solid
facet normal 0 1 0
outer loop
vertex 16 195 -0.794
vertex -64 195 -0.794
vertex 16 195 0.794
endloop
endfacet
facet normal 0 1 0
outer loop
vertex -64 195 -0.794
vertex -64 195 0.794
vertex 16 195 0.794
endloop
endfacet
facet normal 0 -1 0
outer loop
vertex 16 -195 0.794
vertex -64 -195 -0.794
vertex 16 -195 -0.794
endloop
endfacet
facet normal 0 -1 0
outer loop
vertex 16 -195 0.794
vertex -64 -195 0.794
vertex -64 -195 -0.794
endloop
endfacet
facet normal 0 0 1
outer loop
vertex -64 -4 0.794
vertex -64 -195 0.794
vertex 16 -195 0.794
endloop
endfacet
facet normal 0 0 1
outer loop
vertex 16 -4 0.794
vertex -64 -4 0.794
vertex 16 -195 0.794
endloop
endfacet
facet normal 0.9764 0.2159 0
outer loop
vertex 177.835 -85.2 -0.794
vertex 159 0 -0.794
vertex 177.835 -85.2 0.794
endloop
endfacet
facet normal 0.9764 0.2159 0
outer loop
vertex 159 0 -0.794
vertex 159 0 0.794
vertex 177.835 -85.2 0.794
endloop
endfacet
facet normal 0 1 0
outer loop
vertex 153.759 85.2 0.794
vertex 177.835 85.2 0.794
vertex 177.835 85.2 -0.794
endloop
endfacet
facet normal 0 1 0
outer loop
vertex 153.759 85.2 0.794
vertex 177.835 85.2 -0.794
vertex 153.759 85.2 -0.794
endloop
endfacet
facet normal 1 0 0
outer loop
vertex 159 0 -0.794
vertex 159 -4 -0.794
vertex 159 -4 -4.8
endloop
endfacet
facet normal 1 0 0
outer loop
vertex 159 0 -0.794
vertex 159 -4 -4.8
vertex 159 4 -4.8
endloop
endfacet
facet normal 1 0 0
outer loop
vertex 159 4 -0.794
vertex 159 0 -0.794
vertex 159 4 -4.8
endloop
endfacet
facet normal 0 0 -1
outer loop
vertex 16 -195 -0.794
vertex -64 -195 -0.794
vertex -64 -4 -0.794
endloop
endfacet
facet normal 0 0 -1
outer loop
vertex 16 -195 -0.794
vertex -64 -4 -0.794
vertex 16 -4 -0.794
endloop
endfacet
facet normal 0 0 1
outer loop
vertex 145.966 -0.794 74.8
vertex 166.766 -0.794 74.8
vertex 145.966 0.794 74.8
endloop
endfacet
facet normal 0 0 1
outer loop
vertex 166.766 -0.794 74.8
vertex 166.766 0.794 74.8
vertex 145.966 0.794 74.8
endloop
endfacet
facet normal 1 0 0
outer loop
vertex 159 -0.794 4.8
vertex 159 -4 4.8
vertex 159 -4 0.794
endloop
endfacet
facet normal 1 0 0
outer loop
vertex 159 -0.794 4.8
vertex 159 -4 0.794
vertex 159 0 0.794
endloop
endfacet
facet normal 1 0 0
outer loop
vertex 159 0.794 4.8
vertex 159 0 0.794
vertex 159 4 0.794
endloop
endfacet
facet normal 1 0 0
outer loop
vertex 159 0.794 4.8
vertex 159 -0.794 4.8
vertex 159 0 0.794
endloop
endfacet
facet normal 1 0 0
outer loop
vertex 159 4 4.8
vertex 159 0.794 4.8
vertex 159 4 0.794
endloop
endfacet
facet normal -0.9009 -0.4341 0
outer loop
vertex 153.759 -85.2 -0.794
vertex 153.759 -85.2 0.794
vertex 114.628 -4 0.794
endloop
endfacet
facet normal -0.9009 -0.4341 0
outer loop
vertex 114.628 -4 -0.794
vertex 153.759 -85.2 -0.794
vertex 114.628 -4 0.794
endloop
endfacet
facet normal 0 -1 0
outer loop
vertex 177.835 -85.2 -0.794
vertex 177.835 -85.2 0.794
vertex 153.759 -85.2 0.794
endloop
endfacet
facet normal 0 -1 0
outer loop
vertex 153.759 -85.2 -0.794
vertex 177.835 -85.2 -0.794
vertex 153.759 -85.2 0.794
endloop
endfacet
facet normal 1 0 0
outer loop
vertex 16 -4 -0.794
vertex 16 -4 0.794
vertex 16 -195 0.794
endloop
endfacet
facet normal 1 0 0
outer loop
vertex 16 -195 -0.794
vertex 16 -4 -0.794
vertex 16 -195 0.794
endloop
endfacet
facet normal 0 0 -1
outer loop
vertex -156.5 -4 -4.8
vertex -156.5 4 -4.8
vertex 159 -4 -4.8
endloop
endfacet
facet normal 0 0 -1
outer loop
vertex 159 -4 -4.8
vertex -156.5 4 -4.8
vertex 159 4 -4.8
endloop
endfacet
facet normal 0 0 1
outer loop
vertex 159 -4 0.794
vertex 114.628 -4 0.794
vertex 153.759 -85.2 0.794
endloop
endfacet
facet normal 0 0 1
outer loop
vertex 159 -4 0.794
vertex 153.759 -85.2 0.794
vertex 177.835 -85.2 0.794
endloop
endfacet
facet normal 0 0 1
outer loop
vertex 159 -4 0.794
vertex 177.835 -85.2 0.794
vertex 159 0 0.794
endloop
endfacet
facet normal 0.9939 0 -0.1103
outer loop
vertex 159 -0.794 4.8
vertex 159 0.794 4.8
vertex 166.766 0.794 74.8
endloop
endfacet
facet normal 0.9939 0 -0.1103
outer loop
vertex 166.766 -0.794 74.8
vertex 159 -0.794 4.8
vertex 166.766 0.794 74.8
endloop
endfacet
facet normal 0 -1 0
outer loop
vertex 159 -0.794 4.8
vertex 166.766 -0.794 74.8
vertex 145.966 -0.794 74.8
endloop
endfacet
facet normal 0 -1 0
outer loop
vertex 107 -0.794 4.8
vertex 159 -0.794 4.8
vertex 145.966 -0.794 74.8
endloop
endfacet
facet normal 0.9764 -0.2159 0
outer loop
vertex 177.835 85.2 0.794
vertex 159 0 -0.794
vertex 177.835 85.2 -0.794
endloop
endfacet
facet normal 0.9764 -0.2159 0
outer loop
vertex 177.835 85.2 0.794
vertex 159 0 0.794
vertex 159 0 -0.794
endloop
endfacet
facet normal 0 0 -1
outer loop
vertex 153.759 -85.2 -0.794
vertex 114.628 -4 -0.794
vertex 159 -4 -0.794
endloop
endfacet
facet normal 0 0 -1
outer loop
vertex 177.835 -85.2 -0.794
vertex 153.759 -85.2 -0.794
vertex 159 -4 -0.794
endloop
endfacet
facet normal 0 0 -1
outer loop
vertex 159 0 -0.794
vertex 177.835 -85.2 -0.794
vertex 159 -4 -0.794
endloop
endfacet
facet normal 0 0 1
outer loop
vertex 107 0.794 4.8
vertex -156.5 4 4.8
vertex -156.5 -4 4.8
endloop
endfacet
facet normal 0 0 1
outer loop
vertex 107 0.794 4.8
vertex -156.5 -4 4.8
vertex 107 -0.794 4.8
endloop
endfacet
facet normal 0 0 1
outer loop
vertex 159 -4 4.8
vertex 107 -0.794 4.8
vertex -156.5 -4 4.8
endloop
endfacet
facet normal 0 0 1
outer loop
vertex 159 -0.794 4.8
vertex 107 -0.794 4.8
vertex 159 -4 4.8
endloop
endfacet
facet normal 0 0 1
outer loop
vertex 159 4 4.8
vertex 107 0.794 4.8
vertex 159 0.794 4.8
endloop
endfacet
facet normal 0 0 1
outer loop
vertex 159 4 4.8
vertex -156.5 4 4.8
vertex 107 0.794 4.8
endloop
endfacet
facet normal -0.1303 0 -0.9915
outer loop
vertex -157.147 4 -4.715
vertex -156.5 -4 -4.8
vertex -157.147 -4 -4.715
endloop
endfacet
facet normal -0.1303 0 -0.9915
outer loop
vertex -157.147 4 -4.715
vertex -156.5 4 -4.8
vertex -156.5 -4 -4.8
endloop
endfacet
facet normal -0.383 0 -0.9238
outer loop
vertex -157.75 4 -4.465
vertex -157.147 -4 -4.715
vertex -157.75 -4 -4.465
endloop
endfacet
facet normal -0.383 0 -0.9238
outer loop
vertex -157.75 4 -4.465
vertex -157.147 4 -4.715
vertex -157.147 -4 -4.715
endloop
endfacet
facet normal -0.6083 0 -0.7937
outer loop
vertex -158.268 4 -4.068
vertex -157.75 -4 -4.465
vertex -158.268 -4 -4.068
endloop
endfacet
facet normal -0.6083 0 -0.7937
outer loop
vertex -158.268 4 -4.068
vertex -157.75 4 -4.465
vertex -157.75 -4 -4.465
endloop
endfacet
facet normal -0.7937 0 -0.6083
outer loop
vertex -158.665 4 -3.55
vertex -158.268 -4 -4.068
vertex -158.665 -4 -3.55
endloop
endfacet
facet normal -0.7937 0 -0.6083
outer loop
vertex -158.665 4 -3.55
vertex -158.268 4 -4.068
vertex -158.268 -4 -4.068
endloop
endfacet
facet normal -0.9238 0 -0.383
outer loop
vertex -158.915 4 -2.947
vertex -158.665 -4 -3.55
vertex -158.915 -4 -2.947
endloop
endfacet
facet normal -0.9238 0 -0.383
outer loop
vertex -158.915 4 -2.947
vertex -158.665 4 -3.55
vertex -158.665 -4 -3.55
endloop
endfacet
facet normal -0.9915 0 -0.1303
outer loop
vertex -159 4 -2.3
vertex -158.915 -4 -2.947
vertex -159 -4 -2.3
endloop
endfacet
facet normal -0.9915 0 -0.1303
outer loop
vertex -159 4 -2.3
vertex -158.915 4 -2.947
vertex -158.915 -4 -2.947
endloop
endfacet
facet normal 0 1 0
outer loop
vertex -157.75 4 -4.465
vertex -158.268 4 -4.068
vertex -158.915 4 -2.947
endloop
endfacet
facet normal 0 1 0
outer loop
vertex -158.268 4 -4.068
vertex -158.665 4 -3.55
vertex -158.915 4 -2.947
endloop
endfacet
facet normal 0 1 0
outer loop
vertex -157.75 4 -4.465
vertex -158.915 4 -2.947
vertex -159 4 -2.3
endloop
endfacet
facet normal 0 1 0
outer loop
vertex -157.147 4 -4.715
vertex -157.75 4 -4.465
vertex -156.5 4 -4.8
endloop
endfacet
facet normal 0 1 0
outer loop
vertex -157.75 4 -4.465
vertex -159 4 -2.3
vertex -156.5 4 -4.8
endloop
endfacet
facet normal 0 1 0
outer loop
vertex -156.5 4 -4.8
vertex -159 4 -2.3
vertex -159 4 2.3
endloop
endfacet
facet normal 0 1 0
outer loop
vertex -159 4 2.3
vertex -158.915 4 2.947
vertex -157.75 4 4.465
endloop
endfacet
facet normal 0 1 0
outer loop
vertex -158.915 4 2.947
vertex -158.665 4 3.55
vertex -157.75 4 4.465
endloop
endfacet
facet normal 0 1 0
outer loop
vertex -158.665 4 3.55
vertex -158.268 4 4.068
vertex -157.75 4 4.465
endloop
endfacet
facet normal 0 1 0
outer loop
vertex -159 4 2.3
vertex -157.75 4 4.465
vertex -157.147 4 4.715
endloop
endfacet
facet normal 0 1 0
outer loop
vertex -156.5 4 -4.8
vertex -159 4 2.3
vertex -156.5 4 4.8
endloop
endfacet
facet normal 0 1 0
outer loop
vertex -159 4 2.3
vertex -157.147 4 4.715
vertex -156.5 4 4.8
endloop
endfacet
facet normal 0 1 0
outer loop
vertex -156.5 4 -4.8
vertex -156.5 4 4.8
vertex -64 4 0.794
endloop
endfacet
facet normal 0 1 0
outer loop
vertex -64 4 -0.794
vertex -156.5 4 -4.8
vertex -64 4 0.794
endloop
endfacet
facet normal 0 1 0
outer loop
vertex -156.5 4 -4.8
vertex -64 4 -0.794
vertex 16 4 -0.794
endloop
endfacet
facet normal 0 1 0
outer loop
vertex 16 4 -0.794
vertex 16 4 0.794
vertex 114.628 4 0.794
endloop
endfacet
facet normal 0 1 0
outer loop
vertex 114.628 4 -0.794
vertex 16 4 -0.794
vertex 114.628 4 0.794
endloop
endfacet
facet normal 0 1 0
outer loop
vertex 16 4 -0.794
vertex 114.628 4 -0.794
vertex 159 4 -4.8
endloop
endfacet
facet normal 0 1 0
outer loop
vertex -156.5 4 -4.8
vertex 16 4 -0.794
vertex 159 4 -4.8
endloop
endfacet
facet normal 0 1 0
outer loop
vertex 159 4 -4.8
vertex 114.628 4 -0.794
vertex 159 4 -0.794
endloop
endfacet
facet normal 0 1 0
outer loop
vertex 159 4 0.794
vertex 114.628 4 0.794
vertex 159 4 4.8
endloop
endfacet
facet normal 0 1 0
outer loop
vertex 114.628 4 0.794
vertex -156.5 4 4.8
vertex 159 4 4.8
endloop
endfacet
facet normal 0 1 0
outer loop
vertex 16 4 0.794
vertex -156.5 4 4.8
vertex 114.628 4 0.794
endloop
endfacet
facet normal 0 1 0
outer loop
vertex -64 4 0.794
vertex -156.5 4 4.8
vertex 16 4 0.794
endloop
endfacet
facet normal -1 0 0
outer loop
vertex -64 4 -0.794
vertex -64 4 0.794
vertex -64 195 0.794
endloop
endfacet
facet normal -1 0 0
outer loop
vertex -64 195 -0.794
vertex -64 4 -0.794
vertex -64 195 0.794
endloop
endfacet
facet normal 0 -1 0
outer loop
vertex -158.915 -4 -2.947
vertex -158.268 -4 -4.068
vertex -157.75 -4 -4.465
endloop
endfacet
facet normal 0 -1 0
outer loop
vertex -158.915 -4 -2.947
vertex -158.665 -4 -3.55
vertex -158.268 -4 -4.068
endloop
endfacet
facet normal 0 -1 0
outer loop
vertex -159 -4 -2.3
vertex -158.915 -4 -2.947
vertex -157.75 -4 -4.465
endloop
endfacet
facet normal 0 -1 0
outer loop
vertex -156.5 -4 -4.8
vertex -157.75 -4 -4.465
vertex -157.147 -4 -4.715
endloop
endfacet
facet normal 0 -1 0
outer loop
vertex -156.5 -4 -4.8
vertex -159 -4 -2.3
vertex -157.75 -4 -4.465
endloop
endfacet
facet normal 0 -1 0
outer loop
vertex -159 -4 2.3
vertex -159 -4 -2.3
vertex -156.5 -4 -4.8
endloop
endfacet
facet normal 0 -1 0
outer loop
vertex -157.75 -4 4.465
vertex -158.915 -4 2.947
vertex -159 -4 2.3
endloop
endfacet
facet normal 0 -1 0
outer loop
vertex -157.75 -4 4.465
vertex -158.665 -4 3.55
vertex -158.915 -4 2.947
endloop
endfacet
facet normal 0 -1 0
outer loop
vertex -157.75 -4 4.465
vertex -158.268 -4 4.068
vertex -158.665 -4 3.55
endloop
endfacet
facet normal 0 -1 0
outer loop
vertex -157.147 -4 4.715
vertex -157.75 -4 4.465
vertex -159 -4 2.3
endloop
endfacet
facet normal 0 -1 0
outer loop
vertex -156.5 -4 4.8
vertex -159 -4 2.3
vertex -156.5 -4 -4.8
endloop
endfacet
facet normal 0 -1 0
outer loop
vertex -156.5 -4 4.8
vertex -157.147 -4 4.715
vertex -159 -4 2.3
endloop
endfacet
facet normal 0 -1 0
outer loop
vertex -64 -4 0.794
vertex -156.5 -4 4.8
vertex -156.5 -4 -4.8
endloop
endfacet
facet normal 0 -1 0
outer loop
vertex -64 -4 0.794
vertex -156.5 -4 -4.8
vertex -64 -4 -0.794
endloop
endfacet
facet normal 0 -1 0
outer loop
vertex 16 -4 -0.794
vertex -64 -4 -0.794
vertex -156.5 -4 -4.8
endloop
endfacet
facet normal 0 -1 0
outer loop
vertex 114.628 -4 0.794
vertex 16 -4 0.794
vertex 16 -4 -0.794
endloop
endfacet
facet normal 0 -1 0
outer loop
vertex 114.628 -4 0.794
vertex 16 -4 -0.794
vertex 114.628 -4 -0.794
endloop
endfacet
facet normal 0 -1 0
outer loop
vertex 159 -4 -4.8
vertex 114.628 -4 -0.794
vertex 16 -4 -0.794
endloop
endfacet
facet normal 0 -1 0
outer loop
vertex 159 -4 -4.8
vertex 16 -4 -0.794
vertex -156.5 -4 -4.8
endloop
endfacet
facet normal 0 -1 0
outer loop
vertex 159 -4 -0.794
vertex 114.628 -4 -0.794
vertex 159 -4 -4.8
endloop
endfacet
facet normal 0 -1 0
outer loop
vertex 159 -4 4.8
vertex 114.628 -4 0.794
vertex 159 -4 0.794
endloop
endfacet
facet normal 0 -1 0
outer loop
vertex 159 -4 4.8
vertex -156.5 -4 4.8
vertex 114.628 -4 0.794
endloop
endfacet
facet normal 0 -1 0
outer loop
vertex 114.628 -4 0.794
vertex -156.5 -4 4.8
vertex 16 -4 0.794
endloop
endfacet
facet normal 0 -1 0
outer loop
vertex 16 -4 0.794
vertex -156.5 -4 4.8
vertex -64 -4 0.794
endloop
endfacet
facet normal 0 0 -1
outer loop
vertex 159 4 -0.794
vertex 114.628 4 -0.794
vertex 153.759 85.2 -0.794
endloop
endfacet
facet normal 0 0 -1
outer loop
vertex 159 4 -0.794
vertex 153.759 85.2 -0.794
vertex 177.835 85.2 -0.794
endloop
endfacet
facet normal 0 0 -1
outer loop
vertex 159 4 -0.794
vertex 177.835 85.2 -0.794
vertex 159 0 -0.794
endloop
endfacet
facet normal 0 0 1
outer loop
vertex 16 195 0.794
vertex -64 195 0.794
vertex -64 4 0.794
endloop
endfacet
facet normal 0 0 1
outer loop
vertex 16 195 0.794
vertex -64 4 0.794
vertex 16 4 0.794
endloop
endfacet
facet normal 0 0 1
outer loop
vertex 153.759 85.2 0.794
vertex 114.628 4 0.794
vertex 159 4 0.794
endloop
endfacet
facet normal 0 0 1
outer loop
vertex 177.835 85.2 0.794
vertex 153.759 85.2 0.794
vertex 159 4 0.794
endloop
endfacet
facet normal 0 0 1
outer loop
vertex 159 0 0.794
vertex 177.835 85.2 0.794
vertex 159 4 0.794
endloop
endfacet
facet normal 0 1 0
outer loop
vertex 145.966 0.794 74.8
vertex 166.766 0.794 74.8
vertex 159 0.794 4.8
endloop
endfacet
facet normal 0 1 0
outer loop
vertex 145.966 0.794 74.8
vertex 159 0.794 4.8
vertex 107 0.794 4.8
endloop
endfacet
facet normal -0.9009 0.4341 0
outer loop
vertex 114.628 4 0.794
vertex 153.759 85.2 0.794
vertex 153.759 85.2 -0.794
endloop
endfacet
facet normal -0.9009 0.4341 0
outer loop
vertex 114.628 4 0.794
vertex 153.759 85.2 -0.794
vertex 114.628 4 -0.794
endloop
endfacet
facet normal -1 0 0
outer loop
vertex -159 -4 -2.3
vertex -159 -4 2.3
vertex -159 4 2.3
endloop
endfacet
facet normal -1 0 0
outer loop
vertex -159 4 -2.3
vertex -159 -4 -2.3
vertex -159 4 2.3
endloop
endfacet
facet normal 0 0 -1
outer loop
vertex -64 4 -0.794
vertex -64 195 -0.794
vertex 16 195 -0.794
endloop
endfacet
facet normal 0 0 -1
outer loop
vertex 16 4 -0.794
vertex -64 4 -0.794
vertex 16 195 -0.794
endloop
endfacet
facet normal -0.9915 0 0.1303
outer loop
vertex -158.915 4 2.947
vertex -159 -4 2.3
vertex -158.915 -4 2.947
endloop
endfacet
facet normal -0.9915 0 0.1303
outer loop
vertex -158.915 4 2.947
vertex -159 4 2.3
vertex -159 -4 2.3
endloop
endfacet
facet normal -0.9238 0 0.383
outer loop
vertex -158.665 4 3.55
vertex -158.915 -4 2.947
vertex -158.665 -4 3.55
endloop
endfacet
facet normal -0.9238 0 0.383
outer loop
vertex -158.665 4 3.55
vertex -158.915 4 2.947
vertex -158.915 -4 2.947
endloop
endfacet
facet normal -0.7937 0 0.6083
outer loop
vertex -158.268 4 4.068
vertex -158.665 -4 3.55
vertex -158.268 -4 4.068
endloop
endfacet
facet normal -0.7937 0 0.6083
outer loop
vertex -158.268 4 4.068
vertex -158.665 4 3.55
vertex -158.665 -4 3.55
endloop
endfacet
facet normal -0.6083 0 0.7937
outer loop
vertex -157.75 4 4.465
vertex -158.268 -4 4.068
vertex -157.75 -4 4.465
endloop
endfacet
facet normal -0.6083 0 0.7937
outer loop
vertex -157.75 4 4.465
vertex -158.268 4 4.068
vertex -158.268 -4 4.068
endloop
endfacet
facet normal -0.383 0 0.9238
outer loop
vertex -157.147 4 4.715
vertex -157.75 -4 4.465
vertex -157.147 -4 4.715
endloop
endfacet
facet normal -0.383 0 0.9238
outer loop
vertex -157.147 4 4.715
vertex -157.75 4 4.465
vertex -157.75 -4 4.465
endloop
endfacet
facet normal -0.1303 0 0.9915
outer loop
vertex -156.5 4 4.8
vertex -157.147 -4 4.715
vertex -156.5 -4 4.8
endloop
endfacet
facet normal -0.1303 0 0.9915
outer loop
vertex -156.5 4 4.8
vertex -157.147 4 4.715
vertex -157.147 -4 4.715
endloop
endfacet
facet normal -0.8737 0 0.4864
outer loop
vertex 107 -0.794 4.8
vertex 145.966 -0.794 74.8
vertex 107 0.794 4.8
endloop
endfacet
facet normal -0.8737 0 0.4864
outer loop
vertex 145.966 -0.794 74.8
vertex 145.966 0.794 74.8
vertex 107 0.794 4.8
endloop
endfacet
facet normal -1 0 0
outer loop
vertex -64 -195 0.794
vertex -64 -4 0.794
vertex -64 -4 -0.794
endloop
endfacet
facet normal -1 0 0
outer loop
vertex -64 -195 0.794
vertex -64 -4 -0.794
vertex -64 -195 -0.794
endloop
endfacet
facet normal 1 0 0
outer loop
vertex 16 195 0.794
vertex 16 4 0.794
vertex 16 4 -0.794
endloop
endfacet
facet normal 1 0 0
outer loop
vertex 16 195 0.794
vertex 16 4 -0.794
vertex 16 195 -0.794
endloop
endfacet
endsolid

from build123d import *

# Parameters (mm, degrees)
SKETCH1_W           = 318
SKETCH1_H           = 8
BOSS_EXTRUDE1_DEPTH = 4.8
SKETCH3_W           = 80
SKETCH3_H           = 195
BOSS_EXTRUDE2_DEPTH = 0.79375
BOSS_EXTRUDE3_DEPTH = 0.79375
BOSS_EXTRUDE4_DEPTH = 0.79375
FILLET1_R           = 2.5


with BuildPart() as part:
    # Sketch1 → Boss-Extrude1 (new, symmetric)
    with BuildSketch(Plane.XY):
        Rectangle(SKETCH1_W, SKETCH1_H)
    extrude(amount=BOSS_EXTRUDE1_DEPTH, both=True)

    # Sketch3 → Boss-Extrude2 (add, symmetric)
    with BuildSketch(Plane.XY):
        with Locations((-24, 97.5)):
            Rectangle(SKETCH3_W, SKETCH3_H)
    boss_extrude2 = extrude(amount=BOSS_EXTRUDE2_DEPTH, both=True)

    # Mirror1: Boss-Extrude2 across plane
    add(boss_extrude2.mirror(Plane.ZX))

    # Sketch6 → Boss-Extrude3 (add, symmetric)
    with BuildSketch(Plane(origin=(0, 0, 0), x_dir=(1, 0, 0), z_dir=(0, 1, 0))):
        Polygon((159, -4.8), (166.766007972, -74.8), (145.966007972, -74.8), (107, -4.8), align=None)
    extrude(amount=BOSS_EXTRUDE3_DEPTH, both=True)

    # Sketch8 → Boss-Extrude4 (add, symmetric)
    with BuildSketch(Plane.XY):
        Polygon((159, 0), (177.834948036, 85.2), (153.758948036, 85.2), (112.7, 0), align=None)
    boss_extrude4 = extrude(amount=BOSS_EXTRUDE4_DEPTH, both=True)

    # Mirror2: Boss-Extrude4 across plane
    add(boss_extrude4.mirror(Plane.ZX))

    # Fillet1
    fillet1_edges = [part.edges().sort_by_distance(p)[0] for p in [
        (-159, 0, 4.8),
        (-159, 0, -4.8),
    ]]
    fillet(fillet1_edges, radius=FILLET1_R)


solid = part.part
